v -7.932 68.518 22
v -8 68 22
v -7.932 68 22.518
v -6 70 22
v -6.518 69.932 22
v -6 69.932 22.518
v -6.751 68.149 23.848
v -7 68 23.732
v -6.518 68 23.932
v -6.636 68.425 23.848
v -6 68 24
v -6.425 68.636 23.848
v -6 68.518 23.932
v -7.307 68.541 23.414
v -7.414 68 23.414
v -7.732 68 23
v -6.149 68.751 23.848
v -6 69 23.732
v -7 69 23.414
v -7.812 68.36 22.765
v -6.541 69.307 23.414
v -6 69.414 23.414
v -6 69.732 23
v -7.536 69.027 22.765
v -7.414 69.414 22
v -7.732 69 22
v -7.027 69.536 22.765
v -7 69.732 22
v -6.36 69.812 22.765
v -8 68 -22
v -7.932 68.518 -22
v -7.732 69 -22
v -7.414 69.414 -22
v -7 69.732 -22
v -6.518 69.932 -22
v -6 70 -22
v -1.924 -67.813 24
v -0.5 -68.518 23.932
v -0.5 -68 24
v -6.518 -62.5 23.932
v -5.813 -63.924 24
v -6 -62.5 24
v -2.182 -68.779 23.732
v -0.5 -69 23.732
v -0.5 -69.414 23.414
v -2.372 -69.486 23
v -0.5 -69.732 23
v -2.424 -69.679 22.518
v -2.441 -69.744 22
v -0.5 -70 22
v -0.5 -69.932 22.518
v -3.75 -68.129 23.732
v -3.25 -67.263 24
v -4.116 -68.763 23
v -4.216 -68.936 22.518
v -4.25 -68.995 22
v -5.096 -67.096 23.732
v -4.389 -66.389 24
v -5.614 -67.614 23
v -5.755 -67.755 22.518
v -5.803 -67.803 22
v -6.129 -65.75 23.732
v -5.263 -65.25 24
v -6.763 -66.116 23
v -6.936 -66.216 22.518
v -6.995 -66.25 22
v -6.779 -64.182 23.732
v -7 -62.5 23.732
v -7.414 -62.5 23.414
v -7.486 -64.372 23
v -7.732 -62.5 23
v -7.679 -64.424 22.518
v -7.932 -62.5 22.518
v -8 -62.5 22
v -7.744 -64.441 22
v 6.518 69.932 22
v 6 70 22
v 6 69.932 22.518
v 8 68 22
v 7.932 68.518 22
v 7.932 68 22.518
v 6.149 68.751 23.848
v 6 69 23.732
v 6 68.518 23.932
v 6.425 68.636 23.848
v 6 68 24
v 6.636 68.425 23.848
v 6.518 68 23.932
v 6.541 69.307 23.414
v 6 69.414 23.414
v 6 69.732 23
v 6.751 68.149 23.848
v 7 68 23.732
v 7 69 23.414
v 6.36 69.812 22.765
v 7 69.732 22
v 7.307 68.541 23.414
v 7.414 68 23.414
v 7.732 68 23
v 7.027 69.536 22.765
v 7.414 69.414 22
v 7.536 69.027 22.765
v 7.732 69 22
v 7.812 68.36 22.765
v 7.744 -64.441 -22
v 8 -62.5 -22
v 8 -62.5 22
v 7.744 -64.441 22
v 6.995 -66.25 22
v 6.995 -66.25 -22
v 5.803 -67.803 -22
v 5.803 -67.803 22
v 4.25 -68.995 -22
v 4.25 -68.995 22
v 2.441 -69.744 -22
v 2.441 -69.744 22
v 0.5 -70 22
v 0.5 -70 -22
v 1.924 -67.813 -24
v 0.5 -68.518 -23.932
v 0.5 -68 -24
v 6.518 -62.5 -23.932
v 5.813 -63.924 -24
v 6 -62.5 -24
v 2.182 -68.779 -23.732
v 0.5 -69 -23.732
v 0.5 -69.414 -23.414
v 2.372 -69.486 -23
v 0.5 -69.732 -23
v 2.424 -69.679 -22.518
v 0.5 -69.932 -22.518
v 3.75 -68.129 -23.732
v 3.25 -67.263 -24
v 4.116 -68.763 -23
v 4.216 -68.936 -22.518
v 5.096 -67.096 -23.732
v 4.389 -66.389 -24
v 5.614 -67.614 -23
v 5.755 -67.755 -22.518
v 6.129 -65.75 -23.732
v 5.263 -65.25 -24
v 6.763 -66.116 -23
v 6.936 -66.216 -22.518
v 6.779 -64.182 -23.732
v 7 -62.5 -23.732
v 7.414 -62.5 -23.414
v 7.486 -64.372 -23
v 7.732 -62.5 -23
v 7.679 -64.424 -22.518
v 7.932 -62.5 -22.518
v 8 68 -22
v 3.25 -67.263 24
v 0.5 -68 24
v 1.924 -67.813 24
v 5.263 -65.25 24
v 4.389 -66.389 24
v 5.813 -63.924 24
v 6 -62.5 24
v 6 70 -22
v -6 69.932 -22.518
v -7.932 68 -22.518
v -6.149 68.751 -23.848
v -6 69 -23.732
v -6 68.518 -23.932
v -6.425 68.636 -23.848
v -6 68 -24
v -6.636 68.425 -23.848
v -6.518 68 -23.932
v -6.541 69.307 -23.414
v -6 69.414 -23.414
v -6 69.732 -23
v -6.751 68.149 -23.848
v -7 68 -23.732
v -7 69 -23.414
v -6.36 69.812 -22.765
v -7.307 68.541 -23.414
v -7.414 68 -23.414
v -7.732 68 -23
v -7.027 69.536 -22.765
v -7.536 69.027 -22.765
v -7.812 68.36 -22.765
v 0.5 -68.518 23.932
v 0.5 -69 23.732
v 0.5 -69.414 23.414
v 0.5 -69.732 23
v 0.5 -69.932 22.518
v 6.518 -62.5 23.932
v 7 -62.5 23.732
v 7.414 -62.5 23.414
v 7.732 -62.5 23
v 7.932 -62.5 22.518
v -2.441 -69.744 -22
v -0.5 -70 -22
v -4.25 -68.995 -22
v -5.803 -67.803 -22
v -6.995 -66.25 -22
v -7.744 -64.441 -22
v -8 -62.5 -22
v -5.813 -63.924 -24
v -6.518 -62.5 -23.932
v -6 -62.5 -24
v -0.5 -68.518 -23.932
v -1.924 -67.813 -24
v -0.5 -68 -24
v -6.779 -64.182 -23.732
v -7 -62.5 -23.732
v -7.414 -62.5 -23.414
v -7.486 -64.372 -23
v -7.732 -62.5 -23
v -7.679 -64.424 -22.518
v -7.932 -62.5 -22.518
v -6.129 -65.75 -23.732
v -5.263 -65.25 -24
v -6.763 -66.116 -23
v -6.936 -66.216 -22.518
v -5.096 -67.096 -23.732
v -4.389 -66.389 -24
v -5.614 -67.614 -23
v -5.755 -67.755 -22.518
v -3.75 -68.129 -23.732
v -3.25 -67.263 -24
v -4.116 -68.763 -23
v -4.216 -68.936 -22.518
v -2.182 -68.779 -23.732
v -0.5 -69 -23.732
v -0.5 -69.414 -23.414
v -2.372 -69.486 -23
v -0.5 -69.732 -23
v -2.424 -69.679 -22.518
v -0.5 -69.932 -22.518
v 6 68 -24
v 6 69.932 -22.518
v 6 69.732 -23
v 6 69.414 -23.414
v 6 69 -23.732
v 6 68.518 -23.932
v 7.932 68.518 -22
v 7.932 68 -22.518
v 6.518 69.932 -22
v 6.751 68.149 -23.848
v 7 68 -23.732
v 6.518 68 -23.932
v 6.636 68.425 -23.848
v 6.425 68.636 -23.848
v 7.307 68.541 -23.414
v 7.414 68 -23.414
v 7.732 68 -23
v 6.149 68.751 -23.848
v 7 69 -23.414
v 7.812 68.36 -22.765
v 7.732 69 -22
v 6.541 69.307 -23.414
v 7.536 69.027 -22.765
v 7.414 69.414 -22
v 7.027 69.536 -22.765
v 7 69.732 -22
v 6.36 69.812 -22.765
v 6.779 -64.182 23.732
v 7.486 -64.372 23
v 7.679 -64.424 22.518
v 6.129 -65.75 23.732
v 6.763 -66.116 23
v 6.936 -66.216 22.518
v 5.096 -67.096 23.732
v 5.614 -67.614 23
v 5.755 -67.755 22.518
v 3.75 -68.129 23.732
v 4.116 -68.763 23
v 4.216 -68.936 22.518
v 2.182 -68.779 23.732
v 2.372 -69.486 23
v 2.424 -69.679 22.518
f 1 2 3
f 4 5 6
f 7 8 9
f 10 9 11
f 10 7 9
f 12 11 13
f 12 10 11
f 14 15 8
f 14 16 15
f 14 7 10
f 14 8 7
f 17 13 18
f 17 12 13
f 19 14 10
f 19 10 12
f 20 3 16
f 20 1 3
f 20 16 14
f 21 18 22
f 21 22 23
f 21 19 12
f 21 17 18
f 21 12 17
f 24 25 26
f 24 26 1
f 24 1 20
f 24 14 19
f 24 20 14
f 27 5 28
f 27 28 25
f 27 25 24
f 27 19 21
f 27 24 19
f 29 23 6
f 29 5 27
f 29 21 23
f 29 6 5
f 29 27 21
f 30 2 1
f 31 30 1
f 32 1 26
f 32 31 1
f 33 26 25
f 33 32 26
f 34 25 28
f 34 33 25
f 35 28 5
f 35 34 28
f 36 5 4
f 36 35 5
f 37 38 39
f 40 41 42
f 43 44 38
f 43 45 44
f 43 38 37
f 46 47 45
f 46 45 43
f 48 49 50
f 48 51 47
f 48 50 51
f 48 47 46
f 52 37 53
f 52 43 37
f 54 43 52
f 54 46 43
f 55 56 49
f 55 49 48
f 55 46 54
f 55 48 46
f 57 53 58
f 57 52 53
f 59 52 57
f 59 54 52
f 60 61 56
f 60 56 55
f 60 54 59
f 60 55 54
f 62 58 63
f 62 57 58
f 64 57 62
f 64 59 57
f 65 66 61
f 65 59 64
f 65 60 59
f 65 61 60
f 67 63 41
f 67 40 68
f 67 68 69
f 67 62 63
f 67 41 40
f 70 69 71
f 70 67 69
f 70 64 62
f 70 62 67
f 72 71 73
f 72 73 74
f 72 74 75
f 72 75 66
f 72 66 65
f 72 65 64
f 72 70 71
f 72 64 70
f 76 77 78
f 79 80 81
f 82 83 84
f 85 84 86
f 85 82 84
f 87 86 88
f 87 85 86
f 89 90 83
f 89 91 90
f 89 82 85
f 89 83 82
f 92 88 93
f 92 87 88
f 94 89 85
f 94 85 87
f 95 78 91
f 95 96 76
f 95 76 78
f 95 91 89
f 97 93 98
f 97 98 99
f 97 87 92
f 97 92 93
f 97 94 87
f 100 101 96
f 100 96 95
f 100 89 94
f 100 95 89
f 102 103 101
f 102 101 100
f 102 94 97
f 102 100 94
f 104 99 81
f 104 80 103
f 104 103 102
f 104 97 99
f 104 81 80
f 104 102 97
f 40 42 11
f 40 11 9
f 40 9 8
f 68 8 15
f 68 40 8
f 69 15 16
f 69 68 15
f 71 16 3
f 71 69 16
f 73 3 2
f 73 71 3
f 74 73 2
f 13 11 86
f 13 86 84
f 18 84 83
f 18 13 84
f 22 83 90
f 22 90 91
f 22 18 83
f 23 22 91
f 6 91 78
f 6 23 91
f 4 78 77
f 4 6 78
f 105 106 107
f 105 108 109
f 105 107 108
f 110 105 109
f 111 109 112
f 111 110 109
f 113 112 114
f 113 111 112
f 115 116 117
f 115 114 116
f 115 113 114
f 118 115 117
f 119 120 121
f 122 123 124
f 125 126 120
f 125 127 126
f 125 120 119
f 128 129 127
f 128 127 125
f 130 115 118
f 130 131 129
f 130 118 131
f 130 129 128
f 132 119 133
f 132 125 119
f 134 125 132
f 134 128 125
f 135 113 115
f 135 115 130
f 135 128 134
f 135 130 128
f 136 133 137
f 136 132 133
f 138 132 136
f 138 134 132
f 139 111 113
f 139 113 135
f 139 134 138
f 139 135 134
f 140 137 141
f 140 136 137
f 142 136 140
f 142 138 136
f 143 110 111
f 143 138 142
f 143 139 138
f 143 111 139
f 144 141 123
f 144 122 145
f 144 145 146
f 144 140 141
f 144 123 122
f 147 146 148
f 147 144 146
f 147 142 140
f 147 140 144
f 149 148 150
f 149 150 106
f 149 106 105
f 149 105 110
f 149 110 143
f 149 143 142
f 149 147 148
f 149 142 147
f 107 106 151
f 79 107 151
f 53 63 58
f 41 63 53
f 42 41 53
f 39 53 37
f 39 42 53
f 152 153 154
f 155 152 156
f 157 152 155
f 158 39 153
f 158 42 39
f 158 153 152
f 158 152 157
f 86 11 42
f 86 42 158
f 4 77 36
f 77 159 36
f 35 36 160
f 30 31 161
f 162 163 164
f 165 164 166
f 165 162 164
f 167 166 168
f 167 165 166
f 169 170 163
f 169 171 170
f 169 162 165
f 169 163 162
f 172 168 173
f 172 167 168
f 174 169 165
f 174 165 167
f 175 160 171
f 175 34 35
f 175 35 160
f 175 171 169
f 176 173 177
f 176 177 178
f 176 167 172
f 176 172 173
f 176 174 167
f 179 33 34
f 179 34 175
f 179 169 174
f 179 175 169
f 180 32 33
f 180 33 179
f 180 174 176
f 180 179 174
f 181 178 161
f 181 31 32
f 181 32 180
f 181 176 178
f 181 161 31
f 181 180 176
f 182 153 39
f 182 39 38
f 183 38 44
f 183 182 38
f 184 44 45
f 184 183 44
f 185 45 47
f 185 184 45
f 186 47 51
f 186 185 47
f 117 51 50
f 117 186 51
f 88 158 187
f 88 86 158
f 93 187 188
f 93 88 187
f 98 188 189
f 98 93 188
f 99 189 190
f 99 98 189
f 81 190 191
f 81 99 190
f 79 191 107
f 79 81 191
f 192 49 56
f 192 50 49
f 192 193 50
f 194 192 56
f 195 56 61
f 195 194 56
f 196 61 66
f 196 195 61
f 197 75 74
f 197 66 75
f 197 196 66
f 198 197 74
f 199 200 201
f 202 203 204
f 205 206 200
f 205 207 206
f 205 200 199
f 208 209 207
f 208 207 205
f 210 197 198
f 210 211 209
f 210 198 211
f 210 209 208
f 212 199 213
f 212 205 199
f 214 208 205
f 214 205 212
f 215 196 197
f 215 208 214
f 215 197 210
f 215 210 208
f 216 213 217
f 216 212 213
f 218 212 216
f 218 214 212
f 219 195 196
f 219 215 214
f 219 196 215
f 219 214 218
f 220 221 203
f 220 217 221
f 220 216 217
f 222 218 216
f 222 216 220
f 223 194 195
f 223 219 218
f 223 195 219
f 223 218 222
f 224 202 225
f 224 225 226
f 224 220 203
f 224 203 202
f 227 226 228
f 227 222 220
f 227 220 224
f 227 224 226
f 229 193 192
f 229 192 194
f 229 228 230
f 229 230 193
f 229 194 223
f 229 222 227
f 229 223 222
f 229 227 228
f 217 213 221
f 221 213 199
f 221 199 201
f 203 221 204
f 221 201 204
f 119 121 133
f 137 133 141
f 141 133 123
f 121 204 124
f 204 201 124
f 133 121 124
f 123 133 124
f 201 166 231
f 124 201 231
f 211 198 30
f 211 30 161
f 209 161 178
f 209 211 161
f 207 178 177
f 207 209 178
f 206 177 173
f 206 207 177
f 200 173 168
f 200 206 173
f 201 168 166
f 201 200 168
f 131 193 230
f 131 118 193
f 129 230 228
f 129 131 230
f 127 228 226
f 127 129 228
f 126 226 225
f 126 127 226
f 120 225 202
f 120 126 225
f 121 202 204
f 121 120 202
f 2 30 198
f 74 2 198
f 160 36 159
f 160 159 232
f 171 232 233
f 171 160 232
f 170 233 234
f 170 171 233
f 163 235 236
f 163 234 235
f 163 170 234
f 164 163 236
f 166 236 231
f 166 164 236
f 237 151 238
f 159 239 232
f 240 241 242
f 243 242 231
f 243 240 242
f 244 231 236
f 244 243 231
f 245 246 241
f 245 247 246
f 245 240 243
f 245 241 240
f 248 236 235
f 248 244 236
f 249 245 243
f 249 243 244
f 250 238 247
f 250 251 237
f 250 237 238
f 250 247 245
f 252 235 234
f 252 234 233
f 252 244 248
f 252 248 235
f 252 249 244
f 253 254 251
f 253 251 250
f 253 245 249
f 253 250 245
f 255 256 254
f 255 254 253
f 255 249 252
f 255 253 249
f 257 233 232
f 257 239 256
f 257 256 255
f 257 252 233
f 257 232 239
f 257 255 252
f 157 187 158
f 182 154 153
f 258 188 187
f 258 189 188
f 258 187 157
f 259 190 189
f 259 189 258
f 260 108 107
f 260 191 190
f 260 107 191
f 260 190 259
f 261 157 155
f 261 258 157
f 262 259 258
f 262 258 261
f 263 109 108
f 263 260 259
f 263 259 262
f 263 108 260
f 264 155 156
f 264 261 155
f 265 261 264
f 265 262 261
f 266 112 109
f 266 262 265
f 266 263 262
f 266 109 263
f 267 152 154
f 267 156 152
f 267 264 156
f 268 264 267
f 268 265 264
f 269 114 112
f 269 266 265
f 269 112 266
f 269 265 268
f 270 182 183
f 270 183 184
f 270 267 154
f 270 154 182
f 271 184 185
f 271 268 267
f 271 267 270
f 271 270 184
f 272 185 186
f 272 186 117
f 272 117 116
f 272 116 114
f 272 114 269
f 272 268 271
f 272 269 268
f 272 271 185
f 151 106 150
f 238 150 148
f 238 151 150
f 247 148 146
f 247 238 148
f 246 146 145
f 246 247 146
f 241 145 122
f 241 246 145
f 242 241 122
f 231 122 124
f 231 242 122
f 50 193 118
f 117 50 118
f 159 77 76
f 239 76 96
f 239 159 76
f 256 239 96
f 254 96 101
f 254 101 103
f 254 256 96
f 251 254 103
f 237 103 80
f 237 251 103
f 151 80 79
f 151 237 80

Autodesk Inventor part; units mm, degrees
ref_plane "YZ Plane" through (0, 0, 0) normal (1, 0, 0) x (0, 1, 0)
ref_plane "XZ Plane" through (0, 0, 0) normal (0, 1, 0) x (-1, 0, 0)
ref_plane "XY Plane" through (0, 0, 0) normal (0, 0, 1) x (1, 0, 0)
sketch "Sketch1" plane through (0, 0, 0) normal (0, 0, 1) x (1, 0, 0)
  line L0 (-8, -70) -> (8, -70)
  line L1 (8, -70) -> (8, 70)
  line L2 (8, 70) -> (-8, 70)
  line L3 (-8, 70) -> (-8, -70)
  line L4 (-8, -70) -> (8, 70) construction
  line L5 (8, -70) -> (-8, 70) construction
  point P0 (0, 0)
  dimension "d0" = 16
  dimension "d1" = 140
extrude "Extrusion1" add sketch "Sketch1" along normal mid plane 48
fillet "Fillet1" radius 2 10 edges at (8, 70, 0) (-8, 70, 0) (0, 70, 24) (8, 0, 24) (-8, 0, 24) (8, 0, -24) (0, 70, -24) (-8, 0, -24) (0, -70, 24) (0, -70, -24)
fillet "Fillet2" radius 7.5 6 edges at (7.4142, -69.4142, 23.4142) (7.4142, -69.4142, -23.4142) (8, -70, 0) (-7.4142, -69.4142, 23.4142) (-7.4142, -69.4142, -23.4142) (-8, -70, 0)
properties part number "Lipo-3250-3S-Pack-3" material "Acetal Resin, Black"
